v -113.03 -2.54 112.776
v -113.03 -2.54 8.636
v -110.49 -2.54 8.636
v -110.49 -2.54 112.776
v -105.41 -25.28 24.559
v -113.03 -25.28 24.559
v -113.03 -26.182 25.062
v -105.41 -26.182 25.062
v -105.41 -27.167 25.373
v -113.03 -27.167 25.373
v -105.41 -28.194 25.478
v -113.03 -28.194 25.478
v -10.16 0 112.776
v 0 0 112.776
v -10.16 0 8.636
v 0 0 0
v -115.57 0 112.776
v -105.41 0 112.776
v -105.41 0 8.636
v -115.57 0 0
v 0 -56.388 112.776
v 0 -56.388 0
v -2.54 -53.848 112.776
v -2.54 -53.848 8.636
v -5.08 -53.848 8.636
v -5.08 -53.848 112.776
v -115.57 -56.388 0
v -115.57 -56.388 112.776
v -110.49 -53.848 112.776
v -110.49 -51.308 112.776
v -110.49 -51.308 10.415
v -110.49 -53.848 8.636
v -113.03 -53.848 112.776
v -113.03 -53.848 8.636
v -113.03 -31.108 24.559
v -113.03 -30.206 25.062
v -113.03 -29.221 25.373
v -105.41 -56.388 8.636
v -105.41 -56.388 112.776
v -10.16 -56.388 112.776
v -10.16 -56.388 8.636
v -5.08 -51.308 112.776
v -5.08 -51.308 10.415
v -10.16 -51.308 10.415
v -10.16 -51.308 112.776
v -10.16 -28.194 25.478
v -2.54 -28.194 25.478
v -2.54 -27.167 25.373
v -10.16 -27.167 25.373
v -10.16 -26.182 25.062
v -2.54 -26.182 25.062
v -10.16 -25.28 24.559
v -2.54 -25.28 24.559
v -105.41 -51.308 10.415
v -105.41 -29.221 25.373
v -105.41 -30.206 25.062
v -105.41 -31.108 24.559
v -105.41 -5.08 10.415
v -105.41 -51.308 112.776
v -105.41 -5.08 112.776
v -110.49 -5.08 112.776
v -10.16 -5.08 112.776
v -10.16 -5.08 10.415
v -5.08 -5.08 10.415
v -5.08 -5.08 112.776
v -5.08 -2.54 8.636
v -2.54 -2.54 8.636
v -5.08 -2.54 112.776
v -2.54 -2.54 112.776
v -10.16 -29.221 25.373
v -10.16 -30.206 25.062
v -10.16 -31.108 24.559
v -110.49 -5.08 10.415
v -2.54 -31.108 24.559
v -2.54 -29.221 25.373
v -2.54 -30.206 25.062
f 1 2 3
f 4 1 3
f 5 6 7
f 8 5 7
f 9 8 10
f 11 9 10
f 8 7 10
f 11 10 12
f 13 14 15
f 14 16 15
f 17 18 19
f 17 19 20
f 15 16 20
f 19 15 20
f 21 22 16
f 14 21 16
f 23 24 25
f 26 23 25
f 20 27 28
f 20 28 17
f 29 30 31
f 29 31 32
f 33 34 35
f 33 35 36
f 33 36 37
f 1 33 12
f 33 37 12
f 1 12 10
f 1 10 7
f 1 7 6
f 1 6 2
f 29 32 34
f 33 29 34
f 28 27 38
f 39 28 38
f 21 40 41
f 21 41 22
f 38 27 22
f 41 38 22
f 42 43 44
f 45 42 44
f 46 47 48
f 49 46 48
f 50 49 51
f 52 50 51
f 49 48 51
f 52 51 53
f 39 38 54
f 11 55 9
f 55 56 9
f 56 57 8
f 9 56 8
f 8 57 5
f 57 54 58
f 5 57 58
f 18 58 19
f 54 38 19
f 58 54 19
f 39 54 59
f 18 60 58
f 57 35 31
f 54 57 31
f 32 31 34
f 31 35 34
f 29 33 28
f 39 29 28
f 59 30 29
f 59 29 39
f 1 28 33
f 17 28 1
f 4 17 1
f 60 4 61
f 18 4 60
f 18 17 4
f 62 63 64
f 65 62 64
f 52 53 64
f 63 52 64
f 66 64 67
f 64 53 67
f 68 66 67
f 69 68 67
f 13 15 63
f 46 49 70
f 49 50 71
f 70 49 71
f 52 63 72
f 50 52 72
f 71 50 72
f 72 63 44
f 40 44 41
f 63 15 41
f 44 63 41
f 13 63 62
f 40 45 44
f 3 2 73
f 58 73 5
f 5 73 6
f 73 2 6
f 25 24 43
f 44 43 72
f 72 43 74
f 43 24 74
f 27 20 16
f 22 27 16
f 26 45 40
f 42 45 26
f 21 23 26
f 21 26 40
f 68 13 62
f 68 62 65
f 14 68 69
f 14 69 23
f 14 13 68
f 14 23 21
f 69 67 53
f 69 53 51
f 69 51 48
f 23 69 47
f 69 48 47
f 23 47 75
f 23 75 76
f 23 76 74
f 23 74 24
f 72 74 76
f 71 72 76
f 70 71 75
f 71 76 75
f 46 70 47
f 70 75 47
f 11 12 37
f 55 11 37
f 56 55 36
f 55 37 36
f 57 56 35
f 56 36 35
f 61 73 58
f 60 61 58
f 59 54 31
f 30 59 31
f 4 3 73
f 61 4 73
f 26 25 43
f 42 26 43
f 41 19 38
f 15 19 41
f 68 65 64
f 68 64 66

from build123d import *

# Parameters (mm, degrees)
F0_W     = 115.57
F0_H     = 56.388
F1_DEPTH = 8.636
F3_DEPTH = 104.14
F5_DEPTH = 7.62
F7_DEPTH = 7.62


with BuildPart() as f1:
    # F0 (on Top) → F1 (new body)
    with BuildSketch(Plane.XY):
        with Locations((-57.785, -28.194)):
            Rectangle(F0_W, F0_H)
    extrude(amount=F1_DEPTH)

    # F2 (on face) → F3 (join)
    with BuildSketch(Plane.XY.offset(8.636)):
        Polygon((0, -56.388), (0, -28.194), (0, 0), (-10.16, 0), (-10.16, -5.08), (-5.08, -5.08), (-5.08, -2.54), (-2.54, -2.54), (-2.54, -28.194), (-2.54, -53.848), (-5.08, -53.848), (-5.08, -51.308), (-10.16, -51.308), (-10.16, -56.388), align=None)
        Polygon((-105.41, -5.08), (-105.41, 0), (-115.57, 0), (-115.57, -28.194), (-115.57, -56.388), (-105.41, -56.388), (-105.41, -51.308), (-110.49, -51.308), (-110.49, -53.848), (-113.03, -53.848), (-113.03, -28.194), (-113.03, -2.54), (-110.49, -2.54), (-110.49, -5.08), align=None)
    extrude(amount=F3_DEPTH)

    # F4 (on face) → F5 (join)
    with BuildSketch(Plane.YZ.offset(-113.03)):
        with BuildLine():
            Line((-53.848, 8.636), (-28.194, 8.636))
            Line((-28.194, 8.636), (-2.54, 8.636))
            Line((-2.54, 8.636), (-25.280232, 24.558882))
            ThreePointArc((-25.280232, 24.558882), (-26.666415, 25.242471), (-28.194, 25.477589))
            ThreePointArc((-28.194, 25.477589), (-29.721585, 25.242471), (-31.107768, 24.558882))
            Line((-31.107768, 24.558882), (-53.848, 8.636))
        make_face()
    extrude(amount=F5_DEPTH)

    # F6 (on face) → F7 (join)
    with BuildSketch(Plane(origin=(-2.54, 0, 0), x_dir=(0, -1, 0), z_dir=(-1, 0, 0))):
        with BuildLine():
            Line((2.54, 8.636), (28.194, 8.636))
            Line((28.194, 8.636), (53.848, 8.636))
            Line((53.848, 8.636), (31.107768, 24.558882))
            ThreePointArc((31.107768, 24.558882), (29.721585, 25.242471), (28.194, 25.477589))
            ThreePointArc((28.194, 25.477589), (26.666415, 25.242471), (25.280232, 24.558882))
            Line((25.280232, 24.558882), (2.54, 8.636))
        make_face()
    extrude(amount=F7_DEPTH)


solid = f1.part
